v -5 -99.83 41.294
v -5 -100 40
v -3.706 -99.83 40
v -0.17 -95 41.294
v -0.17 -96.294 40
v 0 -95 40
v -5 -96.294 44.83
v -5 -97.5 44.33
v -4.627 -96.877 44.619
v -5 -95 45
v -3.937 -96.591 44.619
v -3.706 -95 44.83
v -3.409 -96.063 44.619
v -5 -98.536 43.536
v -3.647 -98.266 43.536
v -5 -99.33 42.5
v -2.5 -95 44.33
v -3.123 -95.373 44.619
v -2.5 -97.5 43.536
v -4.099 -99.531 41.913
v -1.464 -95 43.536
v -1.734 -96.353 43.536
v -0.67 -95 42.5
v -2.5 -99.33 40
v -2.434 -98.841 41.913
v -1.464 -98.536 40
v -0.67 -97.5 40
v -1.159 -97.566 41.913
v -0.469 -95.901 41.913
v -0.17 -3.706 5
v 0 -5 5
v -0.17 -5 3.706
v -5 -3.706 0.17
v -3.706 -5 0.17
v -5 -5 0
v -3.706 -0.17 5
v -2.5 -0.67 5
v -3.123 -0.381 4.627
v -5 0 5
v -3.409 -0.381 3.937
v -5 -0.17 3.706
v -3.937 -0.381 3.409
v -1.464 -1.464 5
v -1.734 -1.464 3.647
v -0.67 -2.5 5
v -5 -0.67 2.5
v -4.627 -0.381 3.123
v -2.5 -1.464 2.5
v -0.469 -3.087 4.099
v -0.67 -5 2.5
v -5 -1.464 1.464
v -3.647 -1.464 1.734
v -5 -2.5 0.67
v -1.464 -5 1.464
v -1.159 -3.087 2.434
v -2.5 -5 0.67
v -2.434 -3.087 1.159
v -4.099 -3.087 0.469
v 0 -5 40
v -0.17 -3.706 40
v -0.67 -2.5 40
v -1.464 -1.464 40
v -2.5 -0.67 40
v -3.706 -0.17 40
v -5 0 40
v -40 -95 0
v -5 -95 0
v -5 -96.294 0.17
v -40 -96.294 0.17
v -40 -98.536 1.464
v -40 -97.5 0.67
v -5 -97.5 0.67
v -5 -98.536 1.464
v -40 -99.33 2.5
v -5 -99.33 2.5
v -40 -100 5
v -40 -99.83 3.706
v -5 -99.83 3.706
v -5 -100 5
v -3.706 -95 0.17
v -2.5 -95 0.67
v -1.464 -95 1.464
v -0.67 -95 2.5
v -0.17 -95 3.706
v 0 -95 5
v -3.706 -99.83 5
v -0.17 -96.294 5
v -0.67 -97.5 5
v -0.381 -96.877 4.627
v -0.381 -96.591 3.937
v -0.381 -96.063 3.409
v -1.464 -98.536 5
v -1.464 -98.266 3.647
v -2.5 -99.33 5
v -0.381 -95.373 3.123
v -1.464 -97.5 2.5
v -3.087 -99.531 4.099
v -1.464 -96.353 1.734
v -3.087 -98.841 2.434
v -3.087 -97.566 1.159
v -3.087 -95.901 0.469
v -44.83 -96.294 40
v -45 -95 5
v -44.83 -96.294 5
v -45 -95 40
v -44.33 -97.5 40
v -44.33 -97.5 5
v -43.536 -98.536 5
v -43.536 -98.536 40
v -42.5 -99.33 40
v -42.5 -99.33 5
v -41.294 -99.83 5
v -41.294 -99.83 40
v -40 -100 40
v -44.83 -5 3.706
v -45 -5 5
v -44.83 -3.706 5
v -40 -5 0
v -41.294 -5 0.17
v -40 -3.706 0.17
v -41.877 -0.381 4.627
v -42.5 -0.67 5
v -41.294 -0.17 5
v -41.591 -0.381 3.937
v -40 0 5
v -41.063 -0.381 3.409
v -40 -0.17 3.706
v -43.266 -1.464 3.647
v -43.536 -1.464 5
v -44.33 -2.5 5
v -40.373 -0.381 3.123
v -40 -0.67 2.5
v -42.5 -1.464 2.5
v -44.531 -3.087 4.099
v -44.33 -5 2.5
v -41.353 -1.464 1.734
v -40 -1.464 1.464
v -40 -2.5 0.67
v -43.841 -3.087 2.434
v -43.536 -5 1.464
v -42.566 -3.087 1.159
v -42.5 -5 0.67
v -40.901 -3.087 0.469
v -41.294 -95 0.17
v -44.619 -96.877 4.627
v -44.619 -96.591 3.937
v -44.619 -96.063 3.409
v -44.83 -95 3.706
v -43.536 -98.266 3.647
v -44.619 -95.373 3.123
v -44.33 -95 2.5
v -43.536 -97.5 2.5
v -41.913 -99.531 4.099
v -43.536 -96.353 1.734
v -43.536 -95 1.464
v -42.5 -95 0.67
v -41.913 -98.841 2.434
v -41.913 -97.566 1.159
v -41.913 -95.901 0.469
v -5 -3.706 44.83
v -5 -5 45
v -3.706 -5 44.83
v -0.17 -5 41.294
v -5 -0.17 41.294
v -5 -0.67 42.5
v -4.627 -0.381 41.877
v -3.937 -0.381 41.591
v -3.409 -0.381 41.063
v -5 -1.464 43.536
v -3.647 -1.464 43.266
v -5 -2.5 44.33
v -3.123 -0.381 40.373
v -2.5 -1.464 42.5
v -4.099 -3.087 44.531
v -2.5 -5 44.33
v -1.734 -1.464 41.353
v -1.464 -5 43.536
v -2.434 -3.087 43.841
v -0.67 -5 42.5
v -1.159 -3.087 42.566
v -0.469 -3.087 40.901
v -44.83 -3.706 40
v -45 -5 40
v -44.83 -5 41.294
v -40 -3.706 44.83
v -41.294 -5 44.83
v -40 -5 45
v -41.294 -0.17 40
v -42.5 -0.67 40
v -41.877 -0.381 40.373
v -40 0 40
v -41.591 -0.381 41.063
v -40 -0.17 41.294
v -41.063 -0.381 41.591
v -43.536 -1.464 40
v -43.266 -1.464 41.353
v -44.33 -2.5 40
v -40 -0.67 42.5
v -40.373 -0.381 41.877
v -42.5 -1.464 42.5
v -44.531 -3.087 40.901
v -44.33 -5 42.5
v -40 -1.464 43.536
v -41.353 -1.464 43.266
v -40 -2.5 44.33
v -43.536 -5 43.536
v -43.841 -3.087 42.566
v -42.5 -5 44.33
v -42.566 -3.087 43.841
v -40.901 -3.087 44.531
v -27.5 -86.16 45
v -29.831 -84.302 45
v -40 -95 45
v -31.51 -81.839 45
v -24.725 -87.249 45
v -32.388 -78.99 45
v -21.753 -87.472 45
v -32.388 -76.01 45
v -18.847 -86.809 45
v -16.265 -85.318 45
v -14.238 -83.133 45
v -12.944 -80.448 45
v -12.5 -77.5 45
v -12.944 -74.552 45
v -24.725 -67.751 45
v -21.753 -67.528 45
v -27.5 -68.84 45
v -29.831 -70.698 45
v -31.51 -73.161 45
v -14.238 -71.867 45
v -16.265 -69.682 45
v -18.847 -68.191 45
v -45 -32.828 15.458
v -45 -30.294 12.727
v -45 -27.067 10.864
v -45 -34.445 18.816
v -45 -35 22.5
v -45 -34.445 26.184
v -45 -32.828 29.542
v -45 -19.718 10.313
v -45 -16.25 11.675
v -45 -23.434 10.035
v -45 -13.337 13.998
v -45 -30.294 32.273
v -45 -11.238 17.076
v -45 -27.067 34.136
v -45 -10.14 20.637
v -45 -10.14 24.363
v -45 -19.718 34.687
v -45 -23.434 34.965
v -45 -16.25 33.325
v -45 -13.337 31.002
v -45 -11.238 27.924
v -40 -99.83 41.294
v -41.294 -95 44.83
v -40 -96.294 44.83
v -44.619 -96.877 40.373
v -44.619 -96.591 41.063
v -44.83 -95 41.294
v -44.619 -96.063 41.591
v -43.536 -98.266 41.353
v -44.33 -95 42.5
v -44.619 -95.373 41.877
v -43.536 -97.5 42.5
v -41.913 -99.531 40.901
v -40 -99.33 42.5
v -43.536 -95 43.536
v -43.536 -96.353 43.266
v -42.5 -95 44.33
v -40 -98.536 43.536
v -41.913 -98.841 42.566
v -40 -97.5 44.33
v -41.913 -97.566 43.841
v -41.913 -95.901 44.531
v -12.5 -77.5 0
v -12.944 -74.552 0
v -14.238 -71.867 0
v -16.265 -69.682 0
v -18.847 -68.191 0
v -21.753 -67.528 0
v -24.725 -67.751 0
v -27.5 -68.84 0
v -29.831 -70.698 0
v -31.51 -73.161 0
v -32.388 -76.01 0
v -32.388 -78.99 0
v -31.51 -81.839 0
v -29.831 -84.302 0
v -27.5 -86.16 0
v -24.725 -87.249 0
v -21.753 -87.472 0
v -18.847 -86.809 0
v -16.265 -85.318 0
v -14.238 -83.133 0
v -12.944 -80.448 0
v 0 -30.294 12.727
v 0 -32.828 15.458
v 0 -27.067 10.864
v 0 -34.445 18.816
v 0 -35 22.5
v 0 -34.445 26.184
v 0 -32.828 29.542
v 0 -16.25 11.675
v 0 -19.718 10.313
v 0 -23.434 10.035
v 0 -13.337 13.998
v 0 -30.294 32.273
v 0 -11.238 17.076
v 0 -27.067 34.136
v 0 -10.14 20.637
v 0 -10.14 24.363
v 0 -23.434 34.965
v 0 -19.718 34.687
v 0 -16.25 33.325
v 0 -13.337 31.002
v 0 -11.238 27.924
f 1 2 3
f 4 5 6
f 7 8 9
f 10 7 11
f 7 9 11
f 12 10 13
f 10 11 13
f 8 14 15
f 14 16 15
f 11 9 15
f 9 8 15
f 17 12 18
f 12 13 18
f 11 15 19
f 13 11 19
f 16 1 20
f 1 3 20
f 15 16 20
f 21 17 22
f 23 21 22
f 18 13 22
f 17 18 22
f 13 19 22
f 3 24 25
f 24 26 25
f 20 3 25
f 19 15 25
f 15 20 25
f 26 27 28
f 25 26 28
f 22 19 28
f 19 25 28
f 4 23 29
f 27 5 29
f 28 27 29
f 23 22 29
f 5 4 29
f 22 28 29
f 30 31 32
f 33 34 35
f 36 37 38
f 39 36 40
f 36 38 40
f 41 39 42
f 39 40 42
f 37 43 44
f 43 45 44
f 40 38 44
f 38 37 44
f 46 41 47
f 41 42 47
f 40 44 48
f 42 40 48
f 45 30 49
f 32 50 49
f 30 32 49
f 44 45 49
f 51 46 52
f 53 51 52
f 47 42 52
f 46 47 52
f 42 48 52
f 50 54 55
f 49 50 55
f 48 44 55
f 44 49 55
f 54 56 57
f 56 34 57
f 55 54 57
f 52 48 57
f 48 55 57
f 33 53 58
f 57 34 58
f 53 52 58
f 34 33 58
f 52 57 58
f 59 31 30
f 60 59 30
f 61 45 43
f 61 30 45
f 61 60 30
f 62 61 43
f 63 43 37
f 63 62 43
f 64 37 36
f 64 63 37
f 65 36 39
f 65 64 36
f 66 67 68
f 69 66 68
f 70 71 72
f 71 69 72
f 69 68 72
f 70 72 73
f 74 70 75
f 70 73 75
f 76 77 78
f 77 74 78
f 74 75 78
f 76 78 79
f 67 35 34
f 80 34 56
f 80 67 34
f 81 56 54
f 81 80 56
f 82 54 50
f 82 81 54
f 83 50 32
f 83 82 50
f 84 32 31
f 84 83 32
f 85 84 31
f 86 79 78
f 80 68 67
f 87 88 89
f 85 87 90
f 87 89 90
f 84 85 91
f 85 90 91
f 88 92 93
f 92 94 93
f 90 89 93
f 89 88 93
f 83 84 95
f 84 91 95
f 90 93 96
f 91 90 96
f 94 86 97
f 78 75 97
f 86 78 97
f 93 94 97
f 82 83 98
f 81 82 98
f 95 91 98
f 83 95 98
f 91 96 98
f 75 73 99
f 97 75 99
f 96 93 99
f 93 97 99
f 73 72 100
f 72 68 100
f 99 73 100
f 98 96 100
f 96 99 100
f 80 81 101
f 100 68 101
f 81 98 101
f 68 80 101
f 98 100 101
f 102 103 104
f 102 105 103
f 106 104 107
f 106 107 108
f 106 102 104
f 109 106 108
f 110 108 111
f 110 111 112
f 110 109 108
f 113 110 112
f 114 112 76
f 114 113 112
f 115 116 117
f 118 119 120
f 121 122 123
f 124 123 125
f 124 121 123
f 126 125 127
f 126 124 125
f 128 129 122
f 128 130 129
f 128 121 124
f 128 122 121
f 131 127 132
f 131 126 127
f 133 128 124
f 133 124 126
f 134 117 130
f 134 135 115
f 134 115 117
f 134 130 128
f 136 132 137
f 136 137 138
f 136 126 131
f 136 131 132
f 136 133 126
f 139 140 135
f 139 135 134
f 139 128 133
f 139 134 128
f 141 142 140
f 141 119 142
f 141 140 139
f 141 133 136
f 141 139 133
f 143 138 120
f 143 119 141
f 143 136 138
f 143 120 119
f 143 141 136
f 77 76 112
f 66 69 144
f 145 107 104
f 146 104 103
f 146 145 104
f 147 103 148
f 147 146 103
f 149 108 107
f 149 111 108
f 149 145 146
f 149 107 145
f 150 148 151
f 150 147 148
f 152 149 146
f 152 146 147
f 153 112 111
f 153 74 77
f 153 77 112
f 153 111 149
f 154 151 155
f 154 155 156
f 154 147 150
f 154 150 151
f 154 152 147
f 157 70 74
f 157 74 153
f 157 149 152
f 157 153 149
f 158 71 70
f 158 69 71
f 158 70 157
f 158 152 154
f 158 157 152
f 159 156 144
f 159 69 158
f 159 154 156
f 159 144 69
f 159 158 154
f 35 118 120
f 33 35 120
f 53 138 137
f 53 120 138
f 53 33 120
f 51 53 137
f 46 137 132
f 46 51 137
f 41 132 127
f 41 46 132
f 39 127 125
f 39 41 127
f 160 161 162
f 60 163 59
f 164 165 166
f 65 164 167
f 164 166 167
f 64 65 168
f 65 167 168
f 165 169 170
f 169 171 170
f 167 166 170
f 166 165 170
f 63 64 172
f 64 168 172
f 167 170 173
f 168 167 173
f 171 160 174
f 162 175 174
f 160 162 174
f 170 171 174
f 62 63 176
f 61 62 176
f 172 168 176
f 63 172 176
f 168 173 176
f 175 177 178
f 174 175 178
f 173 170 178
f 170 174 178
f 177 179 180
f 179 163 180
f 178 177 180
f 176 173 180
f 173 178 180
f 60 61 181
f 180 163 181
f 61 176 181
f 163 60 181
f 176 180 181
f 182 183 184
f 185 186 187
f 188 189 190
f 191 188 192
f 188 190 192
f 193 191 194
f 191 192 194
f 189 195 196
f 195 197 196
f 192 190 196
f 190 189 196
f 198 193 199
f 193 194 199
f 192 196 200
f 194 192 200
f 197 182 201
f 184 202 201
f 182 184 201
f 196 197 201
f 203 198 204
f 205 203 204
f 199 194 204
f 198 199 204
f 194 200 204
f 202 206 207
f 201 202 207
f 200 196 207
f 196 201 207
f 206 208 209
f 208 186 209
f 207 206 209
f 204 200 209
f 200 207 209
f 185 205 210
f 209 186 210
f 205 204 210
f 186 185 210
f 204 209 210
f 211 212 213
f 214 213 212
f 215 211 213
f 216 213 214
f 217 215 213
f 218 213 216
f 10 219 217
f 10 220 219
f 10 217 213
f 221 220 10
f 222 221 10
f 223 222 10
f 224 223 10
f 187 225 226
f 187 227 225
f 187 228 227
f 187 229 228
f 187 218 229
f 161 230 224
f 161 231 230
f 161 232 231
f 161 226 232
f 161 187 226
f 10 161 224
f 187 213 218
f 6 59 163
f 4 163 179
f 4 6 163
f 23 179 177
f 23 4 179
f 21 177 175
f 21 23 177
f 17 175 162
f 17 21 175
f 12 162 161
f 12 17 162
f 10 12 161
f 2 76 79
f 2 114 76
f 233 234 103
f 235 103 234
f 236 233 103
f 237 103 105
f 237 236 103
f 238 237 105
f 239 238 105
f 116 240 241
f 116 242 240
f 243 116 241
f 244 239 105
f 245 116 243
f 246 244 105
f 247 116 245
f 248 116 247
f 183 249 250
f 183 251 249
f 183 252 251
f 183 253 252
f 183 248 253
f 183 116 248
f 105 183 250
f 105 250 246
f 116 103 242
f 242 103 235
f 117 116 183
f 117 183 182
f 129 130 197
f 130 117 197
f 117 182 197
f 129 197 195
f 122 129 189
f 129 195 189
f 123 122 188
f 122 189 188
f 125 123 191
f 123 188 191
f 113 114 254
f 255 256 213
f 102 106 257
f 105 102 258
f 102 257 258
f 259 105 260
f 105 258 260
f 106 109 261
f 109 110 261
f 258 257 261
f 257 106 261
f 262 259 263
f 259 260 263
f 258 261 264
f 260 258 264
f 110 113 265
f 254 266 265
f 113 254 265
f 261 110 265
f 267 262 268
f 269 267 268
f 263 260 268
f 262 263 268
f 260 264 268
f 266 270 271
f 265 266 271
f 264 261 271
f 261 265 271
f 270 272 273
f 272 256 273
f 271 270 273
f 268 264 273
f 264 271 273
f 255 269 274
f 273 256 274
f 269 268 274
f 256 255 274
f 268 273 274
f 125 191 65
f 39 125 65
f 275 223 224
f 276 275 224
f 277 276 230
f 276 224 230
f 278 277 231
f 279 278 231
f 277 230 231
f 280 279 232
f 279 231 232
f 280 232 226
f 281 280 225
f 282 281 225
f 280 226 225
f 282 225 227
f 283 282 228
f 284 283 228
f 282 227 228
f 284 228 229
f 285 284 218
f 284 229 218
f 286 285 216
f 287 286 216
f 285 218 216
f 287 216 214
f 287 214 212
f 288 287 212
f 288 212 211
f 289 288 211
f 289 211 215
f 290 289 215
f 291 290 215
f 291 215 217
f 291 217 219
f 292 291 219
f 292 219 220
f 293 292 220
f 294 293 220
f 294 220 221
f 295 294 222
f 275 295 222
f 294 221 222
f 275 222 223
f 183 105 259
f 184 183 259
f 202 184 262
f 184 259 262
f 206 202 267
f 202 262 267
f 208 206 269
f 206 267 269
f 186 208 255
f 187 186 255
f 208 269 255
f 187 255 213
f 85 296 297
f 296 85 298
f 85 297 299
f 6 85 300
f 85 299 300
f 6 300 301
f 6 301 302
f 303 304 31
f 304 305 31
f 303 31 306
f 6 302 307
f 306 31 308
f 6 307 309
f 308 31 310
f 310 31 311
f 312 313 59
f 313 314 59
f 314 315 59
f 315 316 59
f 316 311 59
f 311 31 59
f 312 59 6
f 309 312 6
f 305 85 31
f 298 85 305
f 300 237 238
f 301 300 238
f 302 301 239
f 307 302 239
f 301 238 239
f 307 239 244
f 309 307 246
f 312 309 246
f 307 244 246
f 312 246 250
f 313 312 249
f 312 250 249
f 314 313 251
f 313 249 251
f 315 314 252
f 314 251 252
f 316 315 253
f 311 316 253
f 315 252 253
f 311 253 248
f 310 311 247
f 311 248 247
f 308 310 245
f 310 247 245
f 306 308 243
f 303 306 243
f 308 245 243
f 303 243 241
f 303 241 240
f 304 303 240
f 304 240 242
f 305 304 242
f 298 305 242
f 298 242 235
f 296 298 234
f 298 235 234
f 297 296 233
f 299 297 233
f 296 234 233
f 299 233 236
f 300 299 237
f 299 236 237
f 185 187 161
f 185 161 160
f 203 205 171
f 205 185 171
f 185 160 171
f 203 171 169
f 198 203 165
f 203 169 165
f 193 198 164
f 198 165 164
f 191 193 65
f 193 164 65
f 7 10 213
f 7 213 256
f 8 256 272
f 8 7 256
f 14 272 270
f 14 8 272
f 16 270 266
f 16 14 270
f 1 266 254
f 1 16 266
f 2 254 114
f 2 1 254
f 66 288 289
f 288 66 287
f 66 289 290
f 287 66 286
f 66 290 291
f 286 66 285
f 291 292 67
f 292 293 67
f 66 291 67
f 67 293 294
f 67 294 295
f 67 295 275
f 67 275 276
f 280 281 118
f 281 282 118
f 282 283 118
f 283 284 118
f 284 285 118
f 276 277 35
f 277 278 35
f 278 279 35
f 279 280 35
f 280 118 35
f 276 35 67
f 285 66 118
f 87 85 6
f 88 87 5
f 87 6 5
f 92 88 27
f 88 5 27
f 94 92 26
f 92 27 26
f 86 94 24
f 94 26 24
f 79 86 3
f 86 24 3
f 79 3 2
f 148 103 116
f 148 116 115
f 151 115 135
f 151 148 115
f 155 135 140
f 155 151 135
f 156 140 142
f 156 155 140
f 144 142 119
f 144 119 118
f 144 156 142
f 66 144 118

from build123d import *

# Parameters (mm, degrees)
F0_W     = 45
F0_H     = 45
F1_DEPTH = 100
F2_R     = 5
F3_R     = 10
F4_DEPTH = 45
F5_R     = 12.5
F6_DEPTH = 45


with BuildPart() as f1:
    # F0 (on Front) → F1 (new body)
    with BuildSketch(Plane.XZ):
        with Locations((-22.5, 22.5)):
            Rectangle(F0_W, F0_H)
    extrude(amount=F1_DEPTH)

    # F2
    f2_edges = [f1.edges().sort_by_distance(p)[0] for p in [
        (-22.5, -100, 0),
        (0, -100, 22.5),
        (-22.5, -100, 45),
        (-45, -100, 22.5),
        (-45, -50, 45),
        (-45, -50, 0),
        (-45, 0, 22.5),
        (0, -50, 45),
        (-22.5, 0, 45),
        (0, -50, 0),
        (0, 0, 22.5),
        (-22.5, 0, 0),
    ]]
    fillet(f2_edges, radius=F2_R)

    # F3 (on face) → F4 (cut)
    with BuildSketch(Plane.XY.offset(45)):
        with Locations((-22.5, -77.5)):
            Circle(F3_R)
    extrude(amount=-F4_DEPTH, mode=Mode.SUBTRACT)

    # F5 (on face) → F6 (cut)
    with BuildSketch(Plane(origin=(-45, 0, 0), x_dir=(0, -1, 0), z_dir=(-1, 0, 0))):
        with Locations((22.5, 22.5)):
            Circle(F5_R)
    extrude(amount=-F6_DEPTH, mode=Mode.SUBTRACT)


solid = f1.part
